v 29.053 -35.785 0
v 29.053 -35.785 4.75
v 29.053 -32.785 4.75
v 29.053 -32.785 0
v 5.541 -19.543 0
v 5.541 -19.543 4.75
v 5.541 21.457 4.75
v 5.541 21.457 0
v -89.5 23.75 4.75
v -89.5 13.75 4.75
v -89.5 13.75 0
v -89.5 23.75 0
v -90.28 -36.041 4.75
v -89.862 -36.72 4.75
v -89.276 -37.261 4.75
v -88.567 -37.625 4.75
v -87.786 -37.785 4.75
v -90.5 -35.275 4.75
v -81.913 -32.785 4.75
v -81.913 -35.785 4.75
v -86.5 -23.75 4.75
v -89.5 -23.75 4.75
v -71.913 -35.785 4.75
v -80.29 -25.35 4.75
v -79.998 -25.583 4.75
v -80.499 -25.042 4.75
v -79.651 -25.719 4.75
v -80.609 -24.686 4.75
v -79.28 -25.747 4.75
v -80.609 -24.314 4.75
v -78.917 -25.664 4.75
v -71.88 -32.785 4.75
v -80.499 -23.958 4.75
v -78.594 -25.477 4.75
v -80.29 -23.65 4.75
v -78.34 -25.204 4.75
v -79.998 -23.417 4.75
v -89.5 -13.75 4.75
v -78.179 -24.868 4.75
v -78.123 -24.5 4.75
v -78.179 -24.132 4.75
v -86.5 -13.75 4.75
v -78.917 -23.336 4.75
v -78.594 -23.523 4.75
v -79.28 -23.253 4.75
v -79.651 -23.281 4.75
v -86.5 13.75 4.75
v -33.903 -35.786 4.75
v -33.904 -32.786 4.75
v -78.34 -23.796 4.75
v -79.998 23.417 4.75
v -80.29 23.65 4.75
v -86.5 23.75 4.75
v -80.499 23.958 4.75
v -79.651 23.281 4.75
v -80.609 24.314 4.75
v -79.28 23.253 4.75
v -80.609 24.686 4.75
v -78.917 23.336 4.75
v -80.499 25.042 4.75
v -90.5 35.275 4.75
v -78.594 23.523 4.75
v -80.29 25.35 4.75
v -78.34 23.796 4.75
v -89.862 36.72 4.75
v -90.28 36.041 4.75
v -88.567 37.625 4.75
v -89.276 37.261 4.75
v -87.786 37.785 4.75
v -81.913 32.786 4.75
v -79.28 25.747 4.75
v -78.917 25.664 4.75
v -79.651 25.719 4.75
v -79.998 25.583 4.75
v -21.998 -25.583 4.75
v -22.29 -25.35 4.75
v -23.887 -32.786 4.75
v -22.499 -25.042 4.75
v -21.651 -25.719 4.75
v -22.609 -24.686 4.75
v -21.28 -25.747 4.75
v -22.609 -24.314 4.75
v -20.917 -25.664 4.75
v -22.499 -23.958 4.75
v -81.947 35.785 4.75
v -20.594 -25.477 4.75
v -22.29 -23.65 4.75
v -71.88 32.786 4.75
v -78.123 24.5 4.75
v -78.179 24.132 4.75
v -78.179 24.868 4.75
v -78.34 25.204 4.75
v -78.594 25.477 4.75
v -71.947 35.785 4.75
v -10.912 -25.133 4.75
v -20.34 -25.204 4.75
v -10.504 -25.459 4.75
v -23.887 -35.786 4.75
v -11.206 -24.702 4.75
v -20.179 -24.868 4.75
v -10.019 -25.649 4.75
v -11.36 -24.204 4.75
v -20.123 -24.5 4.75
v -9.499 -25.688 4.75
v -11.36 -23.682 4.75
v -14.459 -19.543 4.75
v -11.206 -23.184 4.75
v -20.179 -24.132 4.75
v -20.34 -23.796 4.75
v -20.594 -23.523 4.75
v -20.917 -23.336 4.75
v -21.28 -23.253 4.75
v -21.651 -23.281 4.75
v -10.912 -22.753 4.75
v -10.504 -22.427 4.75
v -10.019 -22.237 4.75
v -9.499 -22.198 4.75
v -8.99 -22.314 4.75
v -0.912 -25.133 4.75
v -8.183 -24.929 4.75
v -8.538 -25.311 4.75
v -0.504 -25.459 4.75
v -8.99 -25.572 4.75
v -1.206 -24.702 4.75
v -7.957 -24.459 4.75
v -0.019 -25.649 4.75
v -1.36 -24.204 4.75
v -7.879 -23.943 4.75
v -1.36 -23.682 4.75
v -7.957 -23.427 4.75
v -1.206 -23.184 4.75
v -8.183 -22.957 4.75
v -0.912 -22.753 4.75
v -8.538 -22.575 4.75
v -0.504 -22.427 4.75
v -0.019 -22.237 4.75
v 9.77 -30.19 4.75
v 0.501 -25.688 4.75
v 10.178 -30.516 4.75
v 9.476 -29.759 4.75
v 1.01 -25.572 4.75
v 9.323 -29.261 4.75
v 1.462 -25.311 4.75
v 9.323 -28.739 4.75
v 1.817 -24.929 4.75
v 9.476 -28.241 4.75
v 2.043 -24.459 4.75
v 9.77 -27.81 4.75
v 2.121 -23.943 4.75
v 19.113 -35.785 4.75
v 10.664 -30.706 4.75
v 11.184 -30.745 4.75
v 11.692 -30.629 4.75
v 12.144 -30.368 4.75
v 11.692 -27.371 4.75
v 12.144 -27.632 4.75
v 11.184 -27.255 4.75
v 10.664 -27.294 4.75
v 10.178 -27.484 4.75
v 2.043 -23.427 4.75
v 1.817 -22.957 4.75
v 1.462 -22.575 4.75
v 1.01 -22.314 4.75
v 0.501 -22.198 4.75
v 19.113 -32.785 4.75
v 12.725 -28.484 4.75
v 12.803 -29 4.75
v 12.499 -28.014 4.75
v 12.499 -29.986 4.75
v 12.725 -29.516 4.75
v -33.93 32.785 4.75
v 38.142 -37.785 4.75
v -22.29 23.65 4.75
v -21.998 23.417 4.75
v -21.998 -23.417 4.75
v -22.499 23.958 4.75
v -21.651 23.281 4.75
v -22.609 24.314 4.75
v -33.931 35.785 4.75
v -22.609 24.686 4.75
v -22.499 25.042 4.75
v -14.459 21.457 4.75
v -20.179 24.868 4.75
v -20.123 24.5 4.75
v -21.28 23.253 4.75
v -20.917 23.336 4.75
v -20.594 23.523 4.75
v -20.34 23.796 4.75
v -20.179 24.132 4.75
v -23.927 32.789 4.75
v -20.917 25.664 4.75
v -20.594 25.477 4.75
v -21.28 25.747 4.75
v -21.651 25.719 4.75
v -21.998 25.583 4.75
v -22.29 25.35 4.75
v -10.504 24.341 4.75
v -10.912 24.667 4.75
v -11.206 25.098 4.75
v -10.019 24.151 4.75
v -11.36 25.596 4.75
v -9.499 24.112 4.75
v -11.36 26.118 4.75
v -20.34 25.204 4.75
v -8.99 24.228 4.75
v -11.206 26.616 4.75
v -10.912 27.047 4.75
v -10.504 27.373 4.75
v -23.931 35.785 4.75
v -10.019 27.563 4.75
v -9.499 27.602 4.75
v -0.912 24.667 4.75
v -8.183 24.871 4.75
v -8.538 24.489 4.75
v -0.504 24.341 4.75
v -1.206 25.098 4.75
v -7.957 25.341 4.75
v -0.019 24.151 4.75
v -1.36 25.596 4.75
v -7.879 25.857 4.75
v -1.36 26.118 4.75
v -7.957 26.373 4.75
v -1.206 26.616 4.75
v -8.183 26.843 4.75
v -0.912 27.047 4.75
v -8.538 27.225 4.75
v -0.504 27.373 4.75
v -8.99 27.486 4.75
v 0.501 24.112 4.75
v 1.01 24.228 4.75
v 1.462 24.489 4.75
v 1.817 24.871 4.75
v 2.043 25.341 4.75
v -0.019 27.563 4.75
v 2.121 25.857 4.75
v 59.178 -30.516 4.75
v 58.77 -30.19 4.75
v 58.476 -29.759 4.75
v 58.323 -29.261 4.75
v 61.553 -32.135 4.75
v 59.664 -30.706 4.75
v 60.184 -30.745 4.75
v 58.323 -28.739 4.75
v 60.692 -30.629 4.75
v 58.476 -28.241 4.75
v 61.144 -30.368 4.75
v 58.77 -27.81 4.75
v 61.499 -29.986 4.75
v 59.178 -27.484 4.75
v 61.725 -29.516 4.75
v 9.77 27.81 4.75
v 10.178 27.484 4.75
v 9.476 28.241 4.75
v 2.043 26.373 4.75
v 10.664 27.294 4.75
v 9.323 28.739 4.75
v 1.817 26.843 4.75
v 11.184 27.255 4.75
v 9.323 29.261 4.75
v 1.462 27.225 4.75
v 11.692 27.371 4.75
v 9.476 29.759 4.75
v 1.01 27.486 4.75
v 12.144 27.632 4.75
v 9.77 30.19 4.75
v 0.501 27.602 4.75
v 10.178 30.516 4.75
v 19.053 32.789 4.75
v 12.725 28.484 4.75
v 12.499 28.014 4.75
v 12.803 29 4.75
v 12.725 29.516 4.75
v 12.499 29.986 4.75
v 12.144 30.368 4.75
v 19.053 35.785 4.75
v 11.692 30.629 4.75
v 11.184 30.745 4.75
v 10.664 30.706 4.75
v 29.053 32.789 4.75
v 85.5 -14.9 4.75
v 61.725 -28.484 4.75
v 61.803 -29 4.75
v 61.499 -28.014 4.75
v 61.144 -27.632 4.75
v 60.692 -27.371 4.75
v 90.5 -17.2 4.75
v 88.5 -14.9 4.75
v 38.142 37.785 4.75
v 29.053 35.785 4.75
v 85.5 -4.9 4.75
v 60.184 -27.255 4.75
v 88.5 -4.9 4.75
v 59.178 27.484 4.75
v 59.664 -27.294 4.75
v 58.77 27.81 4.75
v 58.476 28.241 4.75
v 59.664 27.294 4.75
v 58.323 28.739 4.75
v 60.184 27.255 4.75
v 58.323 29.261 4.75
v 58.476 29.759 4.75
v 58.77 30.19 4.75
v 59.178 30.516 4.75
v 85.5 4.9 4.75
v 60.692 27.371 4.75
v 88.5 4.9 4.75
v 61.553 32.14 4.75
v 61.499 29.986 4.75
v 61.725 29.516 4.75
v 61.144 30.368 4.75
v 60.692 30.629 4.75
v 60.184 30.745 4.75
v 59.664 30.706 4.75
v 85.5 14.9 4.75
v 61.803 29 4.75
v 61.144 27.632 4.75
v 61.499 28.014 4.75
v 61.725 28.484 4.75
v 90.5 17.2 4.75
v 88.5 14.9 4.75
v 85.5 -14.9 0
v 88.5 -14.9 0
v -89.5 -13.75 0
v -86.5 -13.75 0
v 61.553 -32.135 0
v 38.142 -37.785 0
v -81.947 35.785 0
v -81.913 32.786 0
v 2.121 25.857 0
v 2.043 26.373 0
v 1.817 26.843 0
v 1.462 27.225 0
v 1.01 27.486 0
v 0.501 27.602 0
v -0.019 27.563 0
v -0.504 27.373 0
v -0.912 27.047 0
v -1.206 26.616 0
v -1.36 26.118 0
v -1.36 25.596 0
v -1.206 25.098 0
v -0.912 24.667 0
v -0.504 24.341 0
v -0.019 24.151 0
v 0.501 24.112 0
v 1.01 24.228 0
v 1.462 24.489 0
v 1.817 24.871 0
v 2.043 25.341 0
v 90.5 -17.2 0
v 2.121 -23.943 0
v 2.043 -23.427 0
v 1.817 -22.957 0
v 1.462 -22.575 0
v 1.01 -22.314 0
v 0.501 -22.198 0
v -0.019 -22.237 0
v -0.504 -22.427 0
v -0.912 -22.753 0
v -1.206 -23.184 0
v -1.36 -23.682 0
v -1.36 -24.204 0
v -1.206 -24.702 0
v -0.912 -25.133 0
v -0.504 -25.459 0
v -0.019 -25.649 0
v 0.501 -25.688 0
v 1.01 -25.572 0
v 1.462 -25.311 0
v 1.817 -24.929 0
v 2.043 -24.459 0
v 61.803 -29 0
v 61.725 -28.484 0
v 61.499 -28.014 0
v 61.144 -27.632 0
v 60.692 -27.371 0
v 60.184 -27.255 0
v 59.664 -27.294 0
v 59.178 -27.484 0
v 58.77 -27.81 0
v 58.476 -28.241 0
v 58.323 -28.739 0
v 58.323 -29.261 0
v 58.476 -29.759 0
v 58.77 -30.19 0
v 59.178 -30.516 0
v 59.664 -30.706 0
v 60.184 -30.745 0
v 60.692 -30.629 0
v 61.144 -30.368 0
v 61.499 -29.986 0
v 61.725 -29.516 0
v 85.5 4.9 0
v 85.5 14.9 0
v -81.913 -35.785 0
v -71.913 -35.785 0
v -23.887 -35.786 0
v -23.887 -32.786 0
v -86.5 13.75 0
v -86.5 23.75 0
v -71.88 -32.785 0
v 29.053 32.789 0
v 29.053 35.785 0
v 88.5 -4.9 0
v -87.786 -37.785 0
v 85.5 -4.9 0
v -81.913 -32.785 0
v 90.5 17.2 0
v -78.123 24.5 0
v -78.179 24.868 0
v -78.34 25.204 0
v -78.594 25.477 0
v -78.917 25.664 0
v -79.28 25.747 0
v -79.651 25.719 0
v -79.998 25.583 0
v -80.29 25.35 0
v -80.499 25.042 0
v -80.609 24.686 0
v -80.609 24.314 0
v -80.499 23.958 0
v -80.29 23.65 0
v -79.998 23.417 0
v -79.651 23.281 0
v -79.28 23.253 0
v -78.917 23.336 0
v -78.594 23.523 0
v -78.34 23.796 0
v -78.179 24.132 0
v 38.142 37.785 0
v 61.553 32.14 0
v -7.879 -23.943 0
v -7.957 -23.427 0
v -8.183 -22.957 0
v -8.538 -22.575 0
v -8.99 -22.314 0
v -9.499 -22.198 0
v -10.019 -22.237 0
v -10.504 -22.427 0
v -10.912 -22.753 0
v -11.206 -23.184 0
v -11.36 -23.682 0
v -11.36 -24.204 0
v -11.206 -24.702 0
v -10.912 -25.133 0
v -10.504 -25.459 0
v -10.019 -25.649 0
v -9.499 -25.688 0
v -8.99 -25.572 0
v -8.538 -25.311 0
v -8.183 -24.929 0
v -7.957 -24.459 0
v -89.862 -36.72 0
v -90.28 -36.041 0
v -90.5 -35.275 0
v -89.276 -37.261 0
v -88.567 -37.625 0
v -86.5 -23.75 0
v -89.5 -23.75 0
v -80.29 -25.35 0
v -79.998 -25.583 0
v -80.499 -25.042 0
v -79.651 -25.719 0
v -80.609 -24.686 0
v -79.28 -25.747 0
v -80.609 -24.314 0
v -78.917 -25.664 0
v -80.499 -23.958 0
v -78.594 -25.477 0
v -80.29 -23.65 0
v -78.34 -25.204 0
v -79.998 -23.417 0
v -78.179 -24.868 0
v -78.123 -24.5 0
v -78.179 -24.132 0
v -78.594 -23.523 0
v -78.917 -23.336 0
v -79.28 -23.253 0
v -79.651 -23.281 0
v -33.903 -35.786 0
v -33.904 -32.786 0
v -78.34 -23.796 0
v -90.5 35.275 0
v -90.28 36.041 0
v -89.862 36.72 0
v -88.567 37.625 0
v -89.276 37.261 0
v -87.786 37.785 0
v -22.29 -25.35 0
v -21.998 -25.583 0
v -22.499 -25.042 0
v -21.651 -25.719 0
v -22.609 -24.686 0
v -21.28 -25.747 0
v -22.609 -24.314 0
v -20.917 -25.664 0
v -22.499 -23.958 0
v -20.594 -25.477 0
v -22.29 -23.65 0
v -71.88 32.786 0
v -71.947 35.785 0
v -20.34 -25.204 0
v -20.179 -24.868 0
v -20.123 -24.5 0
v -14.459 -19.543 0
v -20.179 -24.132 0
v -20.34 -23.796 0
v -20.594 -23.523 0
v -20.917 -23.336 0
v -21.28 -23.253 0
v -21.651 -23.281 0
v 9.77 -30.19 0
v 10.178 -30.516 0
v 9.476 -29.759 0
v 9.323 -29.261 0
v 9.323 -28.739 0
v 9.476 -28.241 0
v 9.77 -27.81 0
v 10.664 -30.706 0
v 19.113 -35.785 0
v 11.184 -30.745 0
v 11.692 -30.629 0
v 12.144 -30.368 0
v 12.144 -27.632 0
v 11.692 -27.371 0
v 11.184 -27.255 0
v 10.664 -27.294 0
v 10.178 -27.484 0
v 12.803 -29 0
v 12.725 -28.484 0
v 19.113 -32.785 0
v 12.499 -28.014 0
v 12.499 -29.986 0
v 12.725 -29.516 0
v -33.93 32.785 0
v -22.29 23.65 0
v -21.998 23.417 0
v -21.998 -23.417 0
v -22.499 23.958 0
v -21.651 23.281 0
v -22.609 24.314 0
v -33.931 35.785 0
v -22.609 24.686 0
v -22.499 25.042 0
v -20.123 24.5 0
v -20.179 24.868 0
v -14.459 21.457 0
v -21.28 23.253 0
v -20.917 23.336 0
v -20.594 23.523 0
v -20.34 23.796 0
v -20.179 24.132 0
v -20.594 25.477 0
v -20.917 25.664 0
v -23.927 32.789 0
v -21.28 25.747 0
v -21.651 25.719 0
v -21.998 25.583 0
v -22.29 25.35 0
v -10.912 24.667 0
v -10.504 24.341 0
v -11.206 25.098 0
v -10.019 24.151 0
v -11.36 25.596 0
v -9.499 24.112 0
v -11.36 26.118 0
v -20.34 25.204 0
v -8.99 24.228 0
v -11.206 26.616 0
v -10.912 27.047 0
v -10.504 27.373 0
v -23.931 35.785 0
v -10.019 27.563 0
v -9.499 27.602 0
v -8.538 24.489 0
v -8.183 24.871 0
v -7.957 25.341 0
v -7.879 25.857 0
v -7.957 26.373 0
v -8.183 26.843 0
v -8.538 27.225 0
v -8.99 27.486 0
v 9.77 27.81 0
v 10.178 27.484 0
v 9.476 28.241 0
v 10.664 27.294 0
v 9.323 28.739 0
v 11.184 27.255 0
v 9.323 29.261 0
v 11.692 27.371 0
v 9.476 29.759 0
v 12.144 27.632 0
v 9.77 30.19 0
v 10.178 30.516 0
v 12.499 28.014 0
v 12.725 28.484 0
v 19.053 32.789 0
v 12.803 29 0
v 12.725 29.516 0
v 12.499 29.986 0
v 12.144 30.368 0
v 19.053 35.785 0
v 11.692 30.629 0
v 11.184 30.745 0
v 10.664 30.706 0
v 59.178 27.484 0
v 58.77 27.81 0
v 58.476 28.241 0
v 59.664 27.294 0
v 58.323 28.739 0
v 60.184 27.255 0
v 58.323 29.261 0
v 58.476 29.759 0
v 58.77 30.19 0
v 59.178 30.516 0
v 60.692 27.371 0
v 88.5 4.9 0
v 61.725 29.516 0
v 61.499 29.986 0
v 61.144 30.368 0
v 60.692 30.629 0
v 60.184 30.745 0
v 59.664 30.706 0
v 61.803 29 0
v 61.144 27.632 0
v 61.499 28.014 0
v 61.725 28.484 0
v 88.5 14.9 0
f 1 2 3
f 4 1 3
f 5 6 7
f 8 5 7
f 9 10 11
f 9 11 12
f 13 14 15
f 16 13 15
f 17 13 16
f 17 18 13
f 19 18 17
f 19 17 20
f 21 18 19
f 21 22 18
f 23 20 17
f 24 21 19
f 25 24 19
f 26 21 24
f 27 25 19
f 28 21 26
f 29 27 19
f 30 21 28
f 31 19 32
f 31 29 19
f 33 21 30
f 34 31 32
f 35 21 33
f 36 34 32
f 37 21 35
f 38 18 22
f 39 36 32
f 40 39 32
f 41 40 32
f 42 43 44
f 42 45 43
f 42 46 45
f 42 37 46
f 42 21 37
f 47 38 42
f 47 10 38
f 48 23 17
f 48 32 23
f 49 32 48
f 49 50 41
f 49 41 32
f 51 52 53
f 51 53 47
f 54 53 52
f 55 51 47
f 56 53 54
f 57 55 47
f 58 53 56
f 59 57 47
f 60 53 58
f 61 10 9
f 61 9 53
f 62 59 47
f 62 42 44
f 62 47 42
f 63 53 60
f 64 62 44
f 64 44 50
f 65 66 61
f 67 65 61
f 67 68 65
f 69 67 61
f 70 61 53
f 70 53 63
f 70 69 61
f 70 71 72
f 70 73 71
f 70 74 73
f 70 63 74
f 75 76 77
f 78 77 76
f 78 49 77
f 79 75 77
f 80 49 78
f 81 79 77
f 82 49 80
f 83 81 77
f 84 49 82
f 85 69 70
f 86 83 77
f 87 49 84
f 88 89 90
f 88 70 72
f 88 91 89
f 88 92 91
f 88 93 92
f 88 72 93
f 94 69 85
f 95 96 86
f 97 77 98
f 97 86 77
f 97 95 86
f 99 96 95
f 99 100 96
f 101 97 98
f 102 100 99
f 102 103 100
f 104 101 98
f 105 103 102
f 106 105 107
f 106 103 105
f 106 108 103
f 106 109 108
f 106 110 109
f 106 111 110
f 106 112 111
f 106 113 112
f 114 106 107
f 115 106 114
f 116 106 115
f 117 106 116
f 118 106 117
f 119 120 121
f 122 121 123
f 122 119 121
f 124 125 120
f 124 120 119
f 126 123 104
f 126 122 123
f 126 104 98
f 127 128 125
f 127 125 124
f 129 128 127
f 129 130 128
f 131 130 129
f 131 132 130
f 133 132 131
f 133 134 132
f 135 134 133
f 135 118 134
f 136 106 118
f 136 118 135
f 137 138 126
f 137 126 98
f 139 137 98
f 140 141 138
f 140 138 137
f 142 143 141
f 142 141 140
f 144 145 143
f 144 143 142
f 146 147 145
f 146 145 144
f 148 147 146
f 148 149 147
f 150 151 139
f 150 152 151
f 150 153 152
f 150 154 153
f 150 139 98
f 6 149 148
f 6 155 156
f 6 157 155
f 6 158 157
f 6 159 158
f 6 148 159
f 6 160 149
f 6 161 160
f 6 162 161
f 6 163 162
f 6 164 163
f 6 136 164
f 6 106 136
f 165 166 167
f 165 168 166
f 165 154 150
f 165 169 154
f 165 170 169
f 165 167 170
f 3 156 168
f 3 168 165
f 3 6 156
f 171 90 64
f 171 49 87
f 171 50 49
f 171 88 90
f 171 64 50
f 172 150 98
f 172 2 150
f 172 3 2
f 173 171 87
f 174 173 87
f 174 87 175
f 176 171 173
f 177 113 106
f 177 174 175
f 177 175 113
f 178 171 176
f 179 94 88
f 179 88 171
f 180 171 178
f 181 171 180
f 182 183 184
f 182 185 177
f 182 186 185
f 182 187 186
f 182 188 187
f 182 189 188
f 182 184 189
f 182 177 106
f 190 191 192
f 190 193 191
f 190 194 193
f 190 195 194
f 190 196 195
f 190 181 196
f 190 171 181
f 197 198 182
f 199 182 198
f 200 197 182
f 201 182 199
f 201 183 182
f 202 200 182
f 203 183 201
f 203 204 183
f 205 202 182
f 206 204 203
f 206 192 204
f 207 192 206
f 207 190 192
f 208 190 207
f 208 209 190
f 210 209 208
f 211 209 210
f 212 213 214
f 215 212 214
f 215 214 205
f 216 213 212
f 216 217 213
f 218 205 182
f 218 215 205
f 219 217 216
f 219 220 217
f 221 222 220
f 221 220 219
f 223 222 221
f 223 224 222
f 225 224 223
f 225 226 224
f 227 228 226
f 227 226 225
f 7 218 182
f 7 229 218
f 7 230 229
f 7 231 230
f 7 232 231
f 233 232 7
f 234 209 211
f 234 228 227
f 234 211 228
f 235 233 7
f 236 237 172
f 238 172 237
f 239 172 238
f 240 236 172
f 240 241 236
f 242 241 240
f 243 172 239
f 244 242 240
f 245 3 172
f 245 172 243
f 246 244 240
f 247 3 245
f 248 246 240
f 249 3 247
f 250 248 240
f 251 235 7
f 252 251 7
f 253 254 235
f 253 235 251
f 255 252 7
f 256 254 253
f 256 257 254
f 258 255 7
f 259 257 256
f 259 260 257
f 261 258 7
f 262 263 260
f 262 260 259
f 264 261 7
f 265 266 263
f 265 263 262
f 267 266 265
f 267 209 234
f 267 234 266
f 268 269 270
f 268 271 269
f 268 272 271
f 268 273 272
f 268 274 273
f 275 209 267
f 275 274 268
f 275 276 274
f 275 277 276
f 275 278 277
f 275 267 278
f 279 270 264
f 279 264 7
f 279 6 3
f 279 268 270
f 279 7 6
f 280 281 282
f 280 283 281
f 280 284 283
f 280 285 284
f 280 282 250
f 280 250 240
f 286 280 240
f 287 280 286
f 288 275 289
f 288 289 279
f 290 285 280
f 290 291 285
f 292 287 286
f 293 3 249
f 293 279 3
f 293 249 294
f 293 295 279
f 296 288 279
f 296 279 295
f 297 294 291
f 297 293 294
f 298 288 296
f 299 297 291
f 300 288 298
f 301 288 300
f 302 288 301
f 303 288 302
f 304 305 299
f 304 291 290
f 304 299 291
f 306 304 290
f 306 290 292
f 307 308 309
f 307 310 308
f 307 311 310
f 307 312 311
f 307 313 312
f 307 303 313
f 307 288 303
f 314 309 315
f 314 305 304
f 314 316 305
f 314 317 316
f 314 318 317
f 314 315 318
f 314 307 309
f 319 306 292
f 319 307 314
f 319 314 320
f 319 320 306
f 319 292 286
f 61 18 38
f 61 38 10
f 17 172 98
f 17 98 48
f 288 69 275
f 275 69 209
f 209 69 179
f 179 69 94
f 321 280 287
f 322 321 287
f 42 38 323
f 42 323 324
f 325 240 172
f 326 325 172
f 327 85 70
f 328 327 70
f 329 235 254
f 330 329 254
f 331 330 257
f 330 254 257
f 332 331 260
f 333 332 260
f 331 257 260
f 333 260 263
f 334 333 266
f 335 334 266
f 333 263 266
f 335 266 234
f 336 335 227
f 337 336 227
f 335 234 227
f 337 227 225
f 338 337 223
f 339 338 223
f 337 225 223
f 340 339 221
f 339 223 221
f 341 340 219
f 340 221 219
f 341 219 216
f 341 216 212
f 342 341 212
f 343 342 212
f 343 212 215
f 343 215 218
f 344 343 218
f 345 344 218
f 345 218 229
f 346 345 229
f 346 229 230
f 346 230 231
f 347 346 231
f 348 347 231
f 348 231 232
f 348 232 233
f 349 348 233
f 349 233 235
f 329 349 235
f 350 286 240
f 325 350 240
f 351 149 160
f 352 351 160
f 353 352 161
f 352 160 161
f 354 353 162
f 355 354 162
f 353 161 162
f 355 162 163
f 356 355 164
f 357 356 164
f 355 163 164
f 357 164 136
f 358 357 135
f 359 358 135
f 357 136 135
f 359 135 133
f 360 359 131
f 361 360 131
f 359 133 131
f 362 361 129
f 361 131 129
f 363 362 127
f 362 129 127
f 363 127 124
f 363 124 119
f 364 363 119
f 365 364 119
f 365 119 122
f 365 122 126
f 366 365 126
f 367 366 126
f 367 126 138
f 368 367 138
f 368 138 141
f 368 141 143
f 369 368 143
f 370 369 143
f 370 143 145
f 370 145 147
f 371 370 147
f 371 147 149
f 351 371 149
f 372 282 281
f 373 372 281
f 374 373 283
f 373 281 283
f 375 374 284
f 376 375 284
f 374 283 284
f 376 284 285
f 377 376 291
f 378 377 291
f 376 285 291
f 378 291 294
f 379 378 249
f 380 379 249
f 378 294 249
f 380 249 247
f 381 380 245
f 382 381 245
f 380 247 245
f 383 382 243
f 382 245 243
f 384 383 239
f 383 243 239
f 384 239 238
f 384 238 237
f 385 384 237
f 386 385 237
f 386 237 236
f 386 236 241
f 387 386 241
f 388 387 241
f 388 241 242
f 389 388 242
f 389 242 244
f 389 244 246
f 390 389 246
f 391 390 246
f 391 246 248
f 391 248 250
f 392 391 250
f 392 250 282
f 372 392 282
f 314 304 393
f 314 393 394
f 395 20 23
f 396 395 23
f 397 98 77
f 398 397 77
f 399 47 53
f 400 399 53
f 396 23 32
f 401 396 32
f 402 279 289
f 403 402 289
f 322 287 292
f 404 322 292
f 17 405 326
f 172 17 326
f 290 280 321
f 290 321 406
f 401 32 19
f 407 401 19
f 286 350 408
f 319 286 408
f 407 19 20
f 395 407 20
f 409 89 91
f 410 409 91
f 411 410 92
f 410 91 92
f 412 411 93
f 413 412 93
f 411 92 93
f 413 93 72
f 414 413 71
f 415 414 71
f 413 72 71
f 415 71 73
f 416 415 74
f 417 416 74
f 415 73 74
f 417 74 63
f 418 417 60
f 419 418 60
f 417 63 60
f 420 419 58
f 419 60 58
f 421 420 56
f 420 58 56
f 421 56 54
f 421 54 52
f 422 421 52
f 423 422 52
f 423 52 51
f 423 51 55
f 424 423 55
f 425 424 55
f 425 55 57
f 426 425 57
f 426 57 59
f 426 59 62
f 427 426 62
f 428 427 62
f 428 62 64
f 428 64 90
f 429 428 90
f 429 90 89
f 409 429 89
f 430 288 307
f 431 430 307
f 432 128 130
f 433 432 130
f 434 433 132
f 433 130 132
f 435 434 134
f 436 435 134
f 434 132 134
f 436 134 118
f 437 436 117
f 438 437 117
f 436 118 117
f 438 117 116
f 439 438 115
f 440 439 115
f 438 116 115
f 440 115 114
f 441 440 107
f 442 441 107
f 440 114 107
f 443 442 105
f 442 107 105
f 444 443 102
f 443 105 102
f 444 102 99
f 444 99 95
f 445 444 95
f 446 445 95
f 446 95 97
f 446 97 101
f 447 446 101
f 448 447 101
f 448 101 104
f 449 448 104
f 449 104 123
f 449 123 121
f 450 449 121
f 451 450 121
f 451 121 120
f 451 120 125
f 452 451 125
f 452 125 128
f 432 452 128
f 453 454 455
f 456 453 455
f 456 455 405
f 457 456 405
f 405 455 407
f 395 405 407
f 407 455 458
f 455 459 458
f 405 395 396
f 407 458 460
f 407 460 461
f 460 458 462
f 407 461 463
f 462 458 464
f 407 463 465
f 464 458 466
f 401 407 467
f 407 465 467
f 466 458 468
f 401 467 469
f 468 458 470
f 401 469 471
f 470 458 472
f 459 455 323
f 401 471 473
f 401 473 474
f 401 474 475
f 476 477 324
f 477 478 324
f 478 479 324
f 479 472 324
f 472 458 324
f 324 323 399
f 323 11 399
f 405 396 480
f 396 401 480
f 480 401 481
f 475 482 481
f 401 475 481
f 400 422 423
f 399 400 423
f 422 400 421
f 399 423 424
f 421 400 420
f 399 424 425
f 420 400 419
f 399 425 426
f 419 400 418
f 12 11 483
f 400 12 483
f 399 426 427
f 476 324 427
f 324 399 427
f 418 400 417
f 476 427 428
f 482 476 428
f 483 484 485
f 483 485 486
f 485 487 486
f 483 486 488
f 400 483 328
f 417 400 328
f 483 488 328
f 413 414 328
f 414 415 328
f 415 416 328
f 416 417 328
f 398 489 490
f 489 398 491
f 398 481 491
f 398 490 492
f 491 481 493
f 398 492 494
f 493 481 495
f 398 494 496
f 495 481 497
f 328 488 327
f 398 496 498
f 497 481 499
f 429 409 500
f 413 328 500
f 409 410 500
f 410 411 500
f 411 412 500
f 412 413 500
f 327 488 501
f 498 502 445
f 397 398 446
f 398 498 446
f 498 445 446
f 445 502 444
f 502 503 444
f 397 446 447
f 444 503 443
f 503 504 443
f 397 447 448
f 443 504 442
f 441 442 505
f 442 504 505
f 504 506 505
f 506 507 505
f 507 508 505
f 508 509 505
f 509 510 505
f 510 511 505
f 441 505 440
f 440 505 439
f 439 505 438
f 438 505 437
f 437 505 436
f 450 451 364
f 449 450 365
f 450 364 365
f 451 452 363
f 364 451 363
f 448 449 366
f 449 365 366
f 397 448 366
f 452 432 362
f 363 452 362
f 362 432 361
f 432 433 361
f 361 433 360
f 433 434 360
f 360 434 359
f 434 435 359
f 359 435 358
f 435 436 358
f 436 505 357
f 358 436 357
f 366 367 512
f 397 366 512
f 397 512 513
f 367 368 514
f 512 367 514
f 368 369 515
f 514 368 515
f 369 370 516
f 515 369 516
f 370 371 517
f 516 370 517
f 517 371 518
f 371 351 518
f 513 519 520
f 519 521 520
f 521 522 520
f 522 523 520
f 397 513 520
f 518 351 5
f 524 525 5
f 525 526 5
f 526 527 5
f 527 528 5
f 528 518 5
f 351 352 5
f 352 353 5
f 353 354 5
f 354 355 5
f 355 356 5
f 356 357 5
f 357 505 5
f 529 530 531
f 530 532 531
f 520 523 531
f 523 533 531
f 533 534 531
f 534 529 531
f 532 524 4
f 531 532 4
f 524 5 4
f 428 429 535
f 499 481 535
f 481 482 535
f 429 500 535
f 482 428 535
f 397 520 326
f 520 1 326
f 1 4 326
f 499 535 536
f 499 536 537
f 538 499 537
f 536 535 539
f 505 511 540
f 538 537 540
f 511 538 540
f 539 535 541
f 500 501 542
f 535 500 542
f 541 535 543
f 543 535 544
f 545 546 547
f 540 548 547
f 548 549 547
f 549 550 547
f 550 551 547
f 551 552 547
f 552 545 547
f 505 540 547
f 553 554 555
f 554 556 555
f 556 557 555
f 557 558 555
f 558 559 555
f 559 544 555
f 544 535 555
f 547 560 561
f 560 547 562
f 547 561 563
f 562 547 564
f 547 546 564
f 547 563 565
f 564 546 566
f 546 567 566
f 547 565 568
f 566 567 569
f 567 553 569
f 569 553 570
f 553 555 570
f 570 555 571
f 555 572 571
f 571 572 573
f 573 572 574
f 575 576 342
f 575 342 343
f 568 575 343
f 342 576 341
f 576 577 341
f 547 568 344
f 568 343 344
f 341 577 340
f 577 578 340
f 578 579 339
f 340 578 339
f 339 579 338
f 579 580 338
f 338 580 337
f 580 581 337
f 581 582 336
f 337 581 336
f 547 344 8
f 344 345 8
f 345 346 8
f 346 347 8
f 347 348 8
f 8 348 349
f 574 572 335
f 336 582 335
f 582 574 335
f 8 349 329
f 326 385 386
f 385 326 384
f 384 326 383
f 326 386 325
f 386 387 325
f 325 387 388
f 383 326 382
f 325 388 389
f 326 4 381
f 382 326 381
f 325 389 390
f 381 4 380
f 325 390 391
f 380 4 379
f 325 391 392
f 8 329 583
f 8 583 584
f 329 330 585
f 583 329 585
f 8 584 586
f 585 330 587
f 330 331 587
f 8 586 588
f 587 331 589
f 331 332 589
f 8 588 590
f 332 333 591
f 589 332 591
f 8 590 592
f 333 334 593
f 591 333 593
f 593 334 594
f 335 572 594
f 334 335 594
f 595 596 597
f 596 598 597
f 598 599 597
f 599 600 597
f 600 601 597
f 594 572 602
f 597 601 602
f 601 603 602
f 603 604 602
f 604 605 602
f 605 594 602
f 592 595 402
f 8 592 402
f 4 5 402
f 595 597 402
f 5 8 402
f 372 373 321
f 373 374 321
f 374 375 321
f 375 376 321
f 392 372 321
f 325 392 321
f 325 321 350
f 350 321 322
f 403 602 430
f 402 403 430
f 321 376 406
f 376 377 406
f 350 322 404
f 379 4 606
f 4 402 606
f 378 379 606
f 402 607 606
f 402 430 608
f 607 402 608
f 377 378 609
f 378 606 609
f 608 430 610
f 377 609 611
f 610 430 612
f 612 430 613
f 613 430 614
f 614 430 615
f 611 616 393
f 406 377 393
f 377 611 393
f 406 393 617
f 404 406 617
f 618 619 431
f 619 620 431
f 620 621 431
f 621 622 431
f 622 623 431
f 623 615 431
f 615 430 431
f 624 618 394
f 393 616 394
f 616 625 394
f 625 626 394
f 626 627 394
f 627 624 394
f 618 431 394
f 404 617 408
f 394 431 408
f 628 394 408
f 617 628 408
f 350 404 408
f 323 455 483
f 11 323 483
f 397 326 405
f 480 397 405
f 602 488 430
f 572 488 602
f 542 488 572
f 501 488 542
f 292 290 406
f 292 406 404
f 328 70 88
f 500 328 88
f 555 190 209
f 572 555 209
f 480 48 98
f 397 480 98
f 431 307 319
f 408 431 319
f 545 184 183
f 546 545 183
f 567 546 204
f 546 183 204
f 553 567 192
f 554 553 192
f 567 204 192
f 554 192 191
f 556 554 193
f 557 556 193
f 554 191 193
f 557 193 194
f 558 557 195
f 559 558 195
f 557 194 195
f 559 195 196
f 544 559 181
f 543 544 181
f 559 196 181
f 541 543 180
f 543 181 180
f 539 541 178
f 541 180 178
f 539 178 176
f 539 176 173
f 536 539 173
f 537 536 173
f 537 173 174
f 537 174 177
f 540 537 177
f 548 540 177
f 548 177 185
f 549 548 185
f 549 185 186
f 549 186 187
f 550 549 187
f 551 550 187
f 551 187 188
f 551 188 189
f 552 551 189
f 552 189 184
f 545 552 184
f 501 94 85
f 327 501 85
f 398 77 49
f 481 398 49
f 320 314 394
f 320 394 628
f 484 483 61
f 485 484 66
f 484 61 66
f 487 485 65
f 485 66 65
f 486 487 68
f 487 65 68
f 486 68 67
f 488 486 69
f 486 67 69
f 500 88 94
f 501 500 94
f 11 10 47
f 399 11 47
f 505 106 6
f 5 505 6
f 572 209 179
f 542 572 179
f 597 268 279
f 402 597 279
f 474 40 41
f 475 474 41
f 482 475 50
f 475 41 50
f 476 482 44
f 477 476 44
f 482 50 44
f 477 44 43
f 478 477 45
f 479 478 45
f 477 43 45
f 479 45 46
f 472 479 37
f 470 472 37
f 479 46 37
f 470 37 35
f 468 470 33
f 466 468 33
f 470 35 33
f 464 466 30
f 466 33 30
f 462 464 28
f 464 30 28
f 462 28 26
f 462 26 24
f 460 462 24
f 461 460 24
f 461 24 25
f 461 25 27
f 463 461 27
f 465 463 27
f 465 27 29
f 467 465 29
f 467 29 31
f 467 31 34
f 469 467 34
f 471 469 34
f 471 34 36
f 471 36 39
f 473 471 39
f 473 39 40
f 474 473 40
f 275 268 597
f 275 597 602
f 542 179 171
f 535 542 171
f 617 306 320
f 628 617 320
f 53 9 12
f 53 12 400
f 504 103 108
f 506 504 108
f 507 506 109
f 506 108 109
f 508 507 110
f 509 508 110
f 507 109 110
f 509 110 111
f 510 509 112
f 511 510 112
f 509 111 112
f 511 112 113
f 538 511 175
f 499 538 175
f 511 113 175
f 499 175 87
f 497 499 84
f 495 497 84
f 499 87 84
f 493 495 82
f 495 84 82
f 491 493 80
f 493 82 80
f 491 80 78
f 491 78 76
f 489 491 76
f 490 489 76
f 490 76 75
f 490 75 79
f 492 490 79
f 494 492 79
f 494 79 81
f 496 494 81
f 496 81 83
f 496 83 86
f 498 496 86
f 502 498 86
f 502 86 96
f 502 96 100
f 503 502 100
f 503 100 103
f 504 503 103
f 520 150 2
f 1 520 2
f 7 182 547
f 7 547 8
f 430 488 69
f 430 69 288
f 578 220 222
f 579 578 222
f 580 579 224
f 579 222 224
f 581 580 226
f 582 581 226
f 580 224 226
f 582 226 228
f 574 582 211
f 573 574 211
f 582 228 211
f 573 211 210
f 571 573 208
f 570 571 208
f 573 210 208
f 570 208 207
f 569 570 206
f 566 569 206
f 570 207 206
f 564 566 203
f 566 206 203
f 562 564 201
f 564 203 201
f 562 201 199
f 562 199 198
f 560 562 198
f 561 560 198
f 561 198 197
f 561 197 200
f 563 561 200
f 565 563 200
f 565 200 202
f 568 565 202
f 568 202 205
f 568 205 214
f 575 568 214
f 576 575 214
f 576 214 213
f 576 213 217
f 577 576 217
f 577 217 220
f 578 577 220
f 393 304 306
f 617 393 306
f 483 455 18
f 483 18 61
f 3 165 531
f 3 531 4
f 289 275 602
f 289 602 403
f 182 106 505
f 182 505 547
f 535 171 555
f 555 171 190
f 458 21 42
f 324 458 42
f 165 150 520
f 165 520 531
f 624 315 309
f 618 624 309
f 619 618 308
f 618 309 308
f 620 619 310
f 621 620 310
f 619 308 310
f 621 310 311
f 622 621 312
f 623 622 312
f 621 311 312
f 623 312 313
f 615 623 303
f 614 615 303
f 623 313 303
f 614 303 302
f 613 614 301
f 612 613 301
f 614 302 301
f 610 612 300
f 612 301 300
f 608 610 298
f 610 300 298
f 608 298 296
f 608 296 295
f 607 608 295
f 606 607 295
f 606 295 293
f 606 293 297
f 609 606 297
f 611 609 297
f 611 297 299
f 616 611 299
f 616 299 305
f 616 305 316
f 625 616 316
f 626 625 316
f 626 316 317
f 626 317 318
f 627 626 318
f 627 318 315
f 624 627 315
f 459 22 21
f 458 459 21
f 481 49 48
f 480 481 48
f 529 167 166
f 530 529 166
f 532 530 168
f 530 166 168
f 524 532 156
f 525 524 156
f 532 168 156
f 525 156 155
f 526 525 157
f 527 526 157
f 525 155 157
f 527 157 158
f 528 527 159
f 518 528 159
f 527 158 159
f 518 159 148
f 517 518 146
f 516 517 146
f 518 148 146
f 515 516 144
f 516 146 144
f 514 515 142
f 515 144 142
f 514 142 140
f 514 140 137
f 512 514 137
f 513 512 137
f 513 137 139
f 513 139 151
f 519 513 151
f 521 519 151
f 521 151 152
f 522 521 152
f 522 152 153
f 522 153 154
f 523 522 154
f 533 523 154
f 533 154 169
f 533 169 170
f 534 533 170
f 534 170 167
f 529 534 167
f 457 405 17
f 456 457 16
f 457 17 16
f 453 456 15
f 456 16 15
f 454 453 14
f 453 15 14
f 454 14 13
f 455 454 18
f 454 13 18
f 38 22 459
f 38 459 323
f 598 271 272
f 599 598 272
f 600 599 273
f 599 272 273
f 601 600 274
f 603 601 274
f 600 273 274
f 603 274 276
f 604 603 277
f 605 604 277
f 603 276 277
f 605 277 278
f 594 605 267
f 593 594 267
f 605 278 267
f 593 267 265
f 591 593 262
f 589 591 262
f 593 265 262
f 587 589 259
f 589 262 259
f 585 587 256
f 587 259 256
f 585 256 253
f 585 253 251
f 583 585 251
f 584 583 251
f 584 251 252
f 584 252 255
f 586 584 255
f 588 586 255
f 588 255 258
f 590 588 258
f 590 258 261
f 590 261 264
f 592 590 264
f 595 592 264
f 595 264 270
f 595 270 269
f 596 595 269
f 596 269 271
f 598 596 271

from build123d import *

# Parameters (mm, degrees)
SKETCH1_W           = 181
SKETCH1_H           = 75.57
BOSS_EXTRUDE2_DEPTH = 4.75
SKETCH6_W           = 3
SKETCH6_H           = 10
SKETCH6_W_2         = 10
SKETCH6_H_2         = 2.996296141
SKETCH6_W_3         = 9.939831887
SKETCH6_H_3         = 3
SKETCH6_W_4         = 20
SKETCH6_H_4         = 41
SKETCH6_R           = 1.75
SKETCH6_R_2         = 1.25
CUT_EXTRUDE7_DEPTH  = 9


with BuildPart() as part:
    # Sketch1 → Boss-Extrude2 (new body)
    with BuildSketch(Plane.XY):
        Rectangle(SKETCH1_W, SKETCH1_H)
    extrude(amount=BOSS_EXTRUDE2_DEPTH)

    # Sketch6 → Cut-Extrude7 (cut)
    with BuildSketch(Plane.XY.offset(4.75)):
        with BuildLine():
            Line((-90.5, 37.785), (-90.5, 35.274795088))
            ThreePointArc((-90.5, 35.274795088), (-89.587457665, 37.010103297), (-87.786468161, 37.785))
            Line((-87.786468161, 37.785), (-90.5, 37.785))
        make_face()
        with BuildLine():
            ThreePointArc((-87.786468161, -37.785), (-89.587457665, -37.010103297), (-90.5, -35.274795088))
            Line((-90.5, -35.274795088), (-90.5, -37.785))
            Line((-90.5, -37.785), (-87.786468161, -37.785))
        make_face()
        Polygon((90.5, 37.785), (38.141923512, 37.785), (61.552812751, 32.14), (90.5, 17.2), align=None)
        Polygon((61.552812751, -32.135214744), (38.141923512, -37.785), (90.5, -37.785), (90.5, -17.2), align=None)
        Polygon((-81.947178372, 35.785), (-81.913405317, 32.785953243), (-71.879658735, 32.785762546), (-71.94729523, 35.785), align=None)
        with Locations((-88, 18.75)):
            Rectangle(SKETCH6_W, SKETCH6_H)
        with Locations((-88, -18.75)):
            Rectangle(SKETCH6_W, SKETCH6_H)
        Polygon((-33.930858677, 35.785), (-33.929672617, 32.785000234), (-23.927298062, 32.788706115), (-23.930975535, 35.785), align=None)
        Polygon((-71.879658735, -32.785190697), (-81.913405317, -32.785000001), (-81.913478974, -35.785), (-71.913483982, -35.785), align=None)
        Polygon((-33.903748919, -32.785912448), (-33.902562858, -35.785912214), (-23.88684069, -35.786102825), (-23.88684069, -32.786102825), align=None)
        with Locations((87, 9.9)):
            Rectangle(SKETCH6_W, SKETCH6_H)
        with Locations((24.052991197, 34.28685193)):
            Rectangle(SKETCH6_W_2, SKETCH6_H_2)
        with Locations((24.083075253, -34.285)):
            Rectangle(SKETCH6_W_3, SKETCH6_H_3)
        with Locations((-4.459374015, 0.957016564)):
            Rectangle(SKETCH6_W_4, SKETCH6_H_4)
        with Locations((87, -9.9)):
            Rectangle(SKETCH6_W, SKETCH6_H)
        with Locations((-9.629374015, 25.857016564)):
            Circle(SKETCH6_R)
        with Locations((0.370625985, 25.857016564)):
            Circle(SKETCH6_R)
        with Locations((0.370625985, -23.942983436)):
            Circle(SKETCH6_R)
        with Locations((-9.629374015, -23.942983436)):
            Circle(SKETCH6_R)
        with Locations((11.052985258, -29)):
            Circle(SKETCH6_R)
        with Locations((11.052985258, 29)):
            Circle(SKETCH6_R)
        with Locations((60.052985258, -29)):
            Circle(SKETCH6_R)
        with Locations((60.052985258, 29)):
            Circle(SKETCH6_R)
        with Locations((-79.373192673, 24.5)):
            Circle(SKETCH6_R_2)
        with Locations((-79.373192673, -24.5)):
            Circle(SKETCH6_R_2)
        with Locations((-21.373192673, -24.5)):
            Circle(SKETCH6_R_2)
        with Locations((-21.373192673, 24.5)):
            Circle(SKETCH6_R_2)
    extrude(amount=-CUT_EXTRUDE7_DEPTH, mode=Mode.SUBTRACT)


solid = part.part
